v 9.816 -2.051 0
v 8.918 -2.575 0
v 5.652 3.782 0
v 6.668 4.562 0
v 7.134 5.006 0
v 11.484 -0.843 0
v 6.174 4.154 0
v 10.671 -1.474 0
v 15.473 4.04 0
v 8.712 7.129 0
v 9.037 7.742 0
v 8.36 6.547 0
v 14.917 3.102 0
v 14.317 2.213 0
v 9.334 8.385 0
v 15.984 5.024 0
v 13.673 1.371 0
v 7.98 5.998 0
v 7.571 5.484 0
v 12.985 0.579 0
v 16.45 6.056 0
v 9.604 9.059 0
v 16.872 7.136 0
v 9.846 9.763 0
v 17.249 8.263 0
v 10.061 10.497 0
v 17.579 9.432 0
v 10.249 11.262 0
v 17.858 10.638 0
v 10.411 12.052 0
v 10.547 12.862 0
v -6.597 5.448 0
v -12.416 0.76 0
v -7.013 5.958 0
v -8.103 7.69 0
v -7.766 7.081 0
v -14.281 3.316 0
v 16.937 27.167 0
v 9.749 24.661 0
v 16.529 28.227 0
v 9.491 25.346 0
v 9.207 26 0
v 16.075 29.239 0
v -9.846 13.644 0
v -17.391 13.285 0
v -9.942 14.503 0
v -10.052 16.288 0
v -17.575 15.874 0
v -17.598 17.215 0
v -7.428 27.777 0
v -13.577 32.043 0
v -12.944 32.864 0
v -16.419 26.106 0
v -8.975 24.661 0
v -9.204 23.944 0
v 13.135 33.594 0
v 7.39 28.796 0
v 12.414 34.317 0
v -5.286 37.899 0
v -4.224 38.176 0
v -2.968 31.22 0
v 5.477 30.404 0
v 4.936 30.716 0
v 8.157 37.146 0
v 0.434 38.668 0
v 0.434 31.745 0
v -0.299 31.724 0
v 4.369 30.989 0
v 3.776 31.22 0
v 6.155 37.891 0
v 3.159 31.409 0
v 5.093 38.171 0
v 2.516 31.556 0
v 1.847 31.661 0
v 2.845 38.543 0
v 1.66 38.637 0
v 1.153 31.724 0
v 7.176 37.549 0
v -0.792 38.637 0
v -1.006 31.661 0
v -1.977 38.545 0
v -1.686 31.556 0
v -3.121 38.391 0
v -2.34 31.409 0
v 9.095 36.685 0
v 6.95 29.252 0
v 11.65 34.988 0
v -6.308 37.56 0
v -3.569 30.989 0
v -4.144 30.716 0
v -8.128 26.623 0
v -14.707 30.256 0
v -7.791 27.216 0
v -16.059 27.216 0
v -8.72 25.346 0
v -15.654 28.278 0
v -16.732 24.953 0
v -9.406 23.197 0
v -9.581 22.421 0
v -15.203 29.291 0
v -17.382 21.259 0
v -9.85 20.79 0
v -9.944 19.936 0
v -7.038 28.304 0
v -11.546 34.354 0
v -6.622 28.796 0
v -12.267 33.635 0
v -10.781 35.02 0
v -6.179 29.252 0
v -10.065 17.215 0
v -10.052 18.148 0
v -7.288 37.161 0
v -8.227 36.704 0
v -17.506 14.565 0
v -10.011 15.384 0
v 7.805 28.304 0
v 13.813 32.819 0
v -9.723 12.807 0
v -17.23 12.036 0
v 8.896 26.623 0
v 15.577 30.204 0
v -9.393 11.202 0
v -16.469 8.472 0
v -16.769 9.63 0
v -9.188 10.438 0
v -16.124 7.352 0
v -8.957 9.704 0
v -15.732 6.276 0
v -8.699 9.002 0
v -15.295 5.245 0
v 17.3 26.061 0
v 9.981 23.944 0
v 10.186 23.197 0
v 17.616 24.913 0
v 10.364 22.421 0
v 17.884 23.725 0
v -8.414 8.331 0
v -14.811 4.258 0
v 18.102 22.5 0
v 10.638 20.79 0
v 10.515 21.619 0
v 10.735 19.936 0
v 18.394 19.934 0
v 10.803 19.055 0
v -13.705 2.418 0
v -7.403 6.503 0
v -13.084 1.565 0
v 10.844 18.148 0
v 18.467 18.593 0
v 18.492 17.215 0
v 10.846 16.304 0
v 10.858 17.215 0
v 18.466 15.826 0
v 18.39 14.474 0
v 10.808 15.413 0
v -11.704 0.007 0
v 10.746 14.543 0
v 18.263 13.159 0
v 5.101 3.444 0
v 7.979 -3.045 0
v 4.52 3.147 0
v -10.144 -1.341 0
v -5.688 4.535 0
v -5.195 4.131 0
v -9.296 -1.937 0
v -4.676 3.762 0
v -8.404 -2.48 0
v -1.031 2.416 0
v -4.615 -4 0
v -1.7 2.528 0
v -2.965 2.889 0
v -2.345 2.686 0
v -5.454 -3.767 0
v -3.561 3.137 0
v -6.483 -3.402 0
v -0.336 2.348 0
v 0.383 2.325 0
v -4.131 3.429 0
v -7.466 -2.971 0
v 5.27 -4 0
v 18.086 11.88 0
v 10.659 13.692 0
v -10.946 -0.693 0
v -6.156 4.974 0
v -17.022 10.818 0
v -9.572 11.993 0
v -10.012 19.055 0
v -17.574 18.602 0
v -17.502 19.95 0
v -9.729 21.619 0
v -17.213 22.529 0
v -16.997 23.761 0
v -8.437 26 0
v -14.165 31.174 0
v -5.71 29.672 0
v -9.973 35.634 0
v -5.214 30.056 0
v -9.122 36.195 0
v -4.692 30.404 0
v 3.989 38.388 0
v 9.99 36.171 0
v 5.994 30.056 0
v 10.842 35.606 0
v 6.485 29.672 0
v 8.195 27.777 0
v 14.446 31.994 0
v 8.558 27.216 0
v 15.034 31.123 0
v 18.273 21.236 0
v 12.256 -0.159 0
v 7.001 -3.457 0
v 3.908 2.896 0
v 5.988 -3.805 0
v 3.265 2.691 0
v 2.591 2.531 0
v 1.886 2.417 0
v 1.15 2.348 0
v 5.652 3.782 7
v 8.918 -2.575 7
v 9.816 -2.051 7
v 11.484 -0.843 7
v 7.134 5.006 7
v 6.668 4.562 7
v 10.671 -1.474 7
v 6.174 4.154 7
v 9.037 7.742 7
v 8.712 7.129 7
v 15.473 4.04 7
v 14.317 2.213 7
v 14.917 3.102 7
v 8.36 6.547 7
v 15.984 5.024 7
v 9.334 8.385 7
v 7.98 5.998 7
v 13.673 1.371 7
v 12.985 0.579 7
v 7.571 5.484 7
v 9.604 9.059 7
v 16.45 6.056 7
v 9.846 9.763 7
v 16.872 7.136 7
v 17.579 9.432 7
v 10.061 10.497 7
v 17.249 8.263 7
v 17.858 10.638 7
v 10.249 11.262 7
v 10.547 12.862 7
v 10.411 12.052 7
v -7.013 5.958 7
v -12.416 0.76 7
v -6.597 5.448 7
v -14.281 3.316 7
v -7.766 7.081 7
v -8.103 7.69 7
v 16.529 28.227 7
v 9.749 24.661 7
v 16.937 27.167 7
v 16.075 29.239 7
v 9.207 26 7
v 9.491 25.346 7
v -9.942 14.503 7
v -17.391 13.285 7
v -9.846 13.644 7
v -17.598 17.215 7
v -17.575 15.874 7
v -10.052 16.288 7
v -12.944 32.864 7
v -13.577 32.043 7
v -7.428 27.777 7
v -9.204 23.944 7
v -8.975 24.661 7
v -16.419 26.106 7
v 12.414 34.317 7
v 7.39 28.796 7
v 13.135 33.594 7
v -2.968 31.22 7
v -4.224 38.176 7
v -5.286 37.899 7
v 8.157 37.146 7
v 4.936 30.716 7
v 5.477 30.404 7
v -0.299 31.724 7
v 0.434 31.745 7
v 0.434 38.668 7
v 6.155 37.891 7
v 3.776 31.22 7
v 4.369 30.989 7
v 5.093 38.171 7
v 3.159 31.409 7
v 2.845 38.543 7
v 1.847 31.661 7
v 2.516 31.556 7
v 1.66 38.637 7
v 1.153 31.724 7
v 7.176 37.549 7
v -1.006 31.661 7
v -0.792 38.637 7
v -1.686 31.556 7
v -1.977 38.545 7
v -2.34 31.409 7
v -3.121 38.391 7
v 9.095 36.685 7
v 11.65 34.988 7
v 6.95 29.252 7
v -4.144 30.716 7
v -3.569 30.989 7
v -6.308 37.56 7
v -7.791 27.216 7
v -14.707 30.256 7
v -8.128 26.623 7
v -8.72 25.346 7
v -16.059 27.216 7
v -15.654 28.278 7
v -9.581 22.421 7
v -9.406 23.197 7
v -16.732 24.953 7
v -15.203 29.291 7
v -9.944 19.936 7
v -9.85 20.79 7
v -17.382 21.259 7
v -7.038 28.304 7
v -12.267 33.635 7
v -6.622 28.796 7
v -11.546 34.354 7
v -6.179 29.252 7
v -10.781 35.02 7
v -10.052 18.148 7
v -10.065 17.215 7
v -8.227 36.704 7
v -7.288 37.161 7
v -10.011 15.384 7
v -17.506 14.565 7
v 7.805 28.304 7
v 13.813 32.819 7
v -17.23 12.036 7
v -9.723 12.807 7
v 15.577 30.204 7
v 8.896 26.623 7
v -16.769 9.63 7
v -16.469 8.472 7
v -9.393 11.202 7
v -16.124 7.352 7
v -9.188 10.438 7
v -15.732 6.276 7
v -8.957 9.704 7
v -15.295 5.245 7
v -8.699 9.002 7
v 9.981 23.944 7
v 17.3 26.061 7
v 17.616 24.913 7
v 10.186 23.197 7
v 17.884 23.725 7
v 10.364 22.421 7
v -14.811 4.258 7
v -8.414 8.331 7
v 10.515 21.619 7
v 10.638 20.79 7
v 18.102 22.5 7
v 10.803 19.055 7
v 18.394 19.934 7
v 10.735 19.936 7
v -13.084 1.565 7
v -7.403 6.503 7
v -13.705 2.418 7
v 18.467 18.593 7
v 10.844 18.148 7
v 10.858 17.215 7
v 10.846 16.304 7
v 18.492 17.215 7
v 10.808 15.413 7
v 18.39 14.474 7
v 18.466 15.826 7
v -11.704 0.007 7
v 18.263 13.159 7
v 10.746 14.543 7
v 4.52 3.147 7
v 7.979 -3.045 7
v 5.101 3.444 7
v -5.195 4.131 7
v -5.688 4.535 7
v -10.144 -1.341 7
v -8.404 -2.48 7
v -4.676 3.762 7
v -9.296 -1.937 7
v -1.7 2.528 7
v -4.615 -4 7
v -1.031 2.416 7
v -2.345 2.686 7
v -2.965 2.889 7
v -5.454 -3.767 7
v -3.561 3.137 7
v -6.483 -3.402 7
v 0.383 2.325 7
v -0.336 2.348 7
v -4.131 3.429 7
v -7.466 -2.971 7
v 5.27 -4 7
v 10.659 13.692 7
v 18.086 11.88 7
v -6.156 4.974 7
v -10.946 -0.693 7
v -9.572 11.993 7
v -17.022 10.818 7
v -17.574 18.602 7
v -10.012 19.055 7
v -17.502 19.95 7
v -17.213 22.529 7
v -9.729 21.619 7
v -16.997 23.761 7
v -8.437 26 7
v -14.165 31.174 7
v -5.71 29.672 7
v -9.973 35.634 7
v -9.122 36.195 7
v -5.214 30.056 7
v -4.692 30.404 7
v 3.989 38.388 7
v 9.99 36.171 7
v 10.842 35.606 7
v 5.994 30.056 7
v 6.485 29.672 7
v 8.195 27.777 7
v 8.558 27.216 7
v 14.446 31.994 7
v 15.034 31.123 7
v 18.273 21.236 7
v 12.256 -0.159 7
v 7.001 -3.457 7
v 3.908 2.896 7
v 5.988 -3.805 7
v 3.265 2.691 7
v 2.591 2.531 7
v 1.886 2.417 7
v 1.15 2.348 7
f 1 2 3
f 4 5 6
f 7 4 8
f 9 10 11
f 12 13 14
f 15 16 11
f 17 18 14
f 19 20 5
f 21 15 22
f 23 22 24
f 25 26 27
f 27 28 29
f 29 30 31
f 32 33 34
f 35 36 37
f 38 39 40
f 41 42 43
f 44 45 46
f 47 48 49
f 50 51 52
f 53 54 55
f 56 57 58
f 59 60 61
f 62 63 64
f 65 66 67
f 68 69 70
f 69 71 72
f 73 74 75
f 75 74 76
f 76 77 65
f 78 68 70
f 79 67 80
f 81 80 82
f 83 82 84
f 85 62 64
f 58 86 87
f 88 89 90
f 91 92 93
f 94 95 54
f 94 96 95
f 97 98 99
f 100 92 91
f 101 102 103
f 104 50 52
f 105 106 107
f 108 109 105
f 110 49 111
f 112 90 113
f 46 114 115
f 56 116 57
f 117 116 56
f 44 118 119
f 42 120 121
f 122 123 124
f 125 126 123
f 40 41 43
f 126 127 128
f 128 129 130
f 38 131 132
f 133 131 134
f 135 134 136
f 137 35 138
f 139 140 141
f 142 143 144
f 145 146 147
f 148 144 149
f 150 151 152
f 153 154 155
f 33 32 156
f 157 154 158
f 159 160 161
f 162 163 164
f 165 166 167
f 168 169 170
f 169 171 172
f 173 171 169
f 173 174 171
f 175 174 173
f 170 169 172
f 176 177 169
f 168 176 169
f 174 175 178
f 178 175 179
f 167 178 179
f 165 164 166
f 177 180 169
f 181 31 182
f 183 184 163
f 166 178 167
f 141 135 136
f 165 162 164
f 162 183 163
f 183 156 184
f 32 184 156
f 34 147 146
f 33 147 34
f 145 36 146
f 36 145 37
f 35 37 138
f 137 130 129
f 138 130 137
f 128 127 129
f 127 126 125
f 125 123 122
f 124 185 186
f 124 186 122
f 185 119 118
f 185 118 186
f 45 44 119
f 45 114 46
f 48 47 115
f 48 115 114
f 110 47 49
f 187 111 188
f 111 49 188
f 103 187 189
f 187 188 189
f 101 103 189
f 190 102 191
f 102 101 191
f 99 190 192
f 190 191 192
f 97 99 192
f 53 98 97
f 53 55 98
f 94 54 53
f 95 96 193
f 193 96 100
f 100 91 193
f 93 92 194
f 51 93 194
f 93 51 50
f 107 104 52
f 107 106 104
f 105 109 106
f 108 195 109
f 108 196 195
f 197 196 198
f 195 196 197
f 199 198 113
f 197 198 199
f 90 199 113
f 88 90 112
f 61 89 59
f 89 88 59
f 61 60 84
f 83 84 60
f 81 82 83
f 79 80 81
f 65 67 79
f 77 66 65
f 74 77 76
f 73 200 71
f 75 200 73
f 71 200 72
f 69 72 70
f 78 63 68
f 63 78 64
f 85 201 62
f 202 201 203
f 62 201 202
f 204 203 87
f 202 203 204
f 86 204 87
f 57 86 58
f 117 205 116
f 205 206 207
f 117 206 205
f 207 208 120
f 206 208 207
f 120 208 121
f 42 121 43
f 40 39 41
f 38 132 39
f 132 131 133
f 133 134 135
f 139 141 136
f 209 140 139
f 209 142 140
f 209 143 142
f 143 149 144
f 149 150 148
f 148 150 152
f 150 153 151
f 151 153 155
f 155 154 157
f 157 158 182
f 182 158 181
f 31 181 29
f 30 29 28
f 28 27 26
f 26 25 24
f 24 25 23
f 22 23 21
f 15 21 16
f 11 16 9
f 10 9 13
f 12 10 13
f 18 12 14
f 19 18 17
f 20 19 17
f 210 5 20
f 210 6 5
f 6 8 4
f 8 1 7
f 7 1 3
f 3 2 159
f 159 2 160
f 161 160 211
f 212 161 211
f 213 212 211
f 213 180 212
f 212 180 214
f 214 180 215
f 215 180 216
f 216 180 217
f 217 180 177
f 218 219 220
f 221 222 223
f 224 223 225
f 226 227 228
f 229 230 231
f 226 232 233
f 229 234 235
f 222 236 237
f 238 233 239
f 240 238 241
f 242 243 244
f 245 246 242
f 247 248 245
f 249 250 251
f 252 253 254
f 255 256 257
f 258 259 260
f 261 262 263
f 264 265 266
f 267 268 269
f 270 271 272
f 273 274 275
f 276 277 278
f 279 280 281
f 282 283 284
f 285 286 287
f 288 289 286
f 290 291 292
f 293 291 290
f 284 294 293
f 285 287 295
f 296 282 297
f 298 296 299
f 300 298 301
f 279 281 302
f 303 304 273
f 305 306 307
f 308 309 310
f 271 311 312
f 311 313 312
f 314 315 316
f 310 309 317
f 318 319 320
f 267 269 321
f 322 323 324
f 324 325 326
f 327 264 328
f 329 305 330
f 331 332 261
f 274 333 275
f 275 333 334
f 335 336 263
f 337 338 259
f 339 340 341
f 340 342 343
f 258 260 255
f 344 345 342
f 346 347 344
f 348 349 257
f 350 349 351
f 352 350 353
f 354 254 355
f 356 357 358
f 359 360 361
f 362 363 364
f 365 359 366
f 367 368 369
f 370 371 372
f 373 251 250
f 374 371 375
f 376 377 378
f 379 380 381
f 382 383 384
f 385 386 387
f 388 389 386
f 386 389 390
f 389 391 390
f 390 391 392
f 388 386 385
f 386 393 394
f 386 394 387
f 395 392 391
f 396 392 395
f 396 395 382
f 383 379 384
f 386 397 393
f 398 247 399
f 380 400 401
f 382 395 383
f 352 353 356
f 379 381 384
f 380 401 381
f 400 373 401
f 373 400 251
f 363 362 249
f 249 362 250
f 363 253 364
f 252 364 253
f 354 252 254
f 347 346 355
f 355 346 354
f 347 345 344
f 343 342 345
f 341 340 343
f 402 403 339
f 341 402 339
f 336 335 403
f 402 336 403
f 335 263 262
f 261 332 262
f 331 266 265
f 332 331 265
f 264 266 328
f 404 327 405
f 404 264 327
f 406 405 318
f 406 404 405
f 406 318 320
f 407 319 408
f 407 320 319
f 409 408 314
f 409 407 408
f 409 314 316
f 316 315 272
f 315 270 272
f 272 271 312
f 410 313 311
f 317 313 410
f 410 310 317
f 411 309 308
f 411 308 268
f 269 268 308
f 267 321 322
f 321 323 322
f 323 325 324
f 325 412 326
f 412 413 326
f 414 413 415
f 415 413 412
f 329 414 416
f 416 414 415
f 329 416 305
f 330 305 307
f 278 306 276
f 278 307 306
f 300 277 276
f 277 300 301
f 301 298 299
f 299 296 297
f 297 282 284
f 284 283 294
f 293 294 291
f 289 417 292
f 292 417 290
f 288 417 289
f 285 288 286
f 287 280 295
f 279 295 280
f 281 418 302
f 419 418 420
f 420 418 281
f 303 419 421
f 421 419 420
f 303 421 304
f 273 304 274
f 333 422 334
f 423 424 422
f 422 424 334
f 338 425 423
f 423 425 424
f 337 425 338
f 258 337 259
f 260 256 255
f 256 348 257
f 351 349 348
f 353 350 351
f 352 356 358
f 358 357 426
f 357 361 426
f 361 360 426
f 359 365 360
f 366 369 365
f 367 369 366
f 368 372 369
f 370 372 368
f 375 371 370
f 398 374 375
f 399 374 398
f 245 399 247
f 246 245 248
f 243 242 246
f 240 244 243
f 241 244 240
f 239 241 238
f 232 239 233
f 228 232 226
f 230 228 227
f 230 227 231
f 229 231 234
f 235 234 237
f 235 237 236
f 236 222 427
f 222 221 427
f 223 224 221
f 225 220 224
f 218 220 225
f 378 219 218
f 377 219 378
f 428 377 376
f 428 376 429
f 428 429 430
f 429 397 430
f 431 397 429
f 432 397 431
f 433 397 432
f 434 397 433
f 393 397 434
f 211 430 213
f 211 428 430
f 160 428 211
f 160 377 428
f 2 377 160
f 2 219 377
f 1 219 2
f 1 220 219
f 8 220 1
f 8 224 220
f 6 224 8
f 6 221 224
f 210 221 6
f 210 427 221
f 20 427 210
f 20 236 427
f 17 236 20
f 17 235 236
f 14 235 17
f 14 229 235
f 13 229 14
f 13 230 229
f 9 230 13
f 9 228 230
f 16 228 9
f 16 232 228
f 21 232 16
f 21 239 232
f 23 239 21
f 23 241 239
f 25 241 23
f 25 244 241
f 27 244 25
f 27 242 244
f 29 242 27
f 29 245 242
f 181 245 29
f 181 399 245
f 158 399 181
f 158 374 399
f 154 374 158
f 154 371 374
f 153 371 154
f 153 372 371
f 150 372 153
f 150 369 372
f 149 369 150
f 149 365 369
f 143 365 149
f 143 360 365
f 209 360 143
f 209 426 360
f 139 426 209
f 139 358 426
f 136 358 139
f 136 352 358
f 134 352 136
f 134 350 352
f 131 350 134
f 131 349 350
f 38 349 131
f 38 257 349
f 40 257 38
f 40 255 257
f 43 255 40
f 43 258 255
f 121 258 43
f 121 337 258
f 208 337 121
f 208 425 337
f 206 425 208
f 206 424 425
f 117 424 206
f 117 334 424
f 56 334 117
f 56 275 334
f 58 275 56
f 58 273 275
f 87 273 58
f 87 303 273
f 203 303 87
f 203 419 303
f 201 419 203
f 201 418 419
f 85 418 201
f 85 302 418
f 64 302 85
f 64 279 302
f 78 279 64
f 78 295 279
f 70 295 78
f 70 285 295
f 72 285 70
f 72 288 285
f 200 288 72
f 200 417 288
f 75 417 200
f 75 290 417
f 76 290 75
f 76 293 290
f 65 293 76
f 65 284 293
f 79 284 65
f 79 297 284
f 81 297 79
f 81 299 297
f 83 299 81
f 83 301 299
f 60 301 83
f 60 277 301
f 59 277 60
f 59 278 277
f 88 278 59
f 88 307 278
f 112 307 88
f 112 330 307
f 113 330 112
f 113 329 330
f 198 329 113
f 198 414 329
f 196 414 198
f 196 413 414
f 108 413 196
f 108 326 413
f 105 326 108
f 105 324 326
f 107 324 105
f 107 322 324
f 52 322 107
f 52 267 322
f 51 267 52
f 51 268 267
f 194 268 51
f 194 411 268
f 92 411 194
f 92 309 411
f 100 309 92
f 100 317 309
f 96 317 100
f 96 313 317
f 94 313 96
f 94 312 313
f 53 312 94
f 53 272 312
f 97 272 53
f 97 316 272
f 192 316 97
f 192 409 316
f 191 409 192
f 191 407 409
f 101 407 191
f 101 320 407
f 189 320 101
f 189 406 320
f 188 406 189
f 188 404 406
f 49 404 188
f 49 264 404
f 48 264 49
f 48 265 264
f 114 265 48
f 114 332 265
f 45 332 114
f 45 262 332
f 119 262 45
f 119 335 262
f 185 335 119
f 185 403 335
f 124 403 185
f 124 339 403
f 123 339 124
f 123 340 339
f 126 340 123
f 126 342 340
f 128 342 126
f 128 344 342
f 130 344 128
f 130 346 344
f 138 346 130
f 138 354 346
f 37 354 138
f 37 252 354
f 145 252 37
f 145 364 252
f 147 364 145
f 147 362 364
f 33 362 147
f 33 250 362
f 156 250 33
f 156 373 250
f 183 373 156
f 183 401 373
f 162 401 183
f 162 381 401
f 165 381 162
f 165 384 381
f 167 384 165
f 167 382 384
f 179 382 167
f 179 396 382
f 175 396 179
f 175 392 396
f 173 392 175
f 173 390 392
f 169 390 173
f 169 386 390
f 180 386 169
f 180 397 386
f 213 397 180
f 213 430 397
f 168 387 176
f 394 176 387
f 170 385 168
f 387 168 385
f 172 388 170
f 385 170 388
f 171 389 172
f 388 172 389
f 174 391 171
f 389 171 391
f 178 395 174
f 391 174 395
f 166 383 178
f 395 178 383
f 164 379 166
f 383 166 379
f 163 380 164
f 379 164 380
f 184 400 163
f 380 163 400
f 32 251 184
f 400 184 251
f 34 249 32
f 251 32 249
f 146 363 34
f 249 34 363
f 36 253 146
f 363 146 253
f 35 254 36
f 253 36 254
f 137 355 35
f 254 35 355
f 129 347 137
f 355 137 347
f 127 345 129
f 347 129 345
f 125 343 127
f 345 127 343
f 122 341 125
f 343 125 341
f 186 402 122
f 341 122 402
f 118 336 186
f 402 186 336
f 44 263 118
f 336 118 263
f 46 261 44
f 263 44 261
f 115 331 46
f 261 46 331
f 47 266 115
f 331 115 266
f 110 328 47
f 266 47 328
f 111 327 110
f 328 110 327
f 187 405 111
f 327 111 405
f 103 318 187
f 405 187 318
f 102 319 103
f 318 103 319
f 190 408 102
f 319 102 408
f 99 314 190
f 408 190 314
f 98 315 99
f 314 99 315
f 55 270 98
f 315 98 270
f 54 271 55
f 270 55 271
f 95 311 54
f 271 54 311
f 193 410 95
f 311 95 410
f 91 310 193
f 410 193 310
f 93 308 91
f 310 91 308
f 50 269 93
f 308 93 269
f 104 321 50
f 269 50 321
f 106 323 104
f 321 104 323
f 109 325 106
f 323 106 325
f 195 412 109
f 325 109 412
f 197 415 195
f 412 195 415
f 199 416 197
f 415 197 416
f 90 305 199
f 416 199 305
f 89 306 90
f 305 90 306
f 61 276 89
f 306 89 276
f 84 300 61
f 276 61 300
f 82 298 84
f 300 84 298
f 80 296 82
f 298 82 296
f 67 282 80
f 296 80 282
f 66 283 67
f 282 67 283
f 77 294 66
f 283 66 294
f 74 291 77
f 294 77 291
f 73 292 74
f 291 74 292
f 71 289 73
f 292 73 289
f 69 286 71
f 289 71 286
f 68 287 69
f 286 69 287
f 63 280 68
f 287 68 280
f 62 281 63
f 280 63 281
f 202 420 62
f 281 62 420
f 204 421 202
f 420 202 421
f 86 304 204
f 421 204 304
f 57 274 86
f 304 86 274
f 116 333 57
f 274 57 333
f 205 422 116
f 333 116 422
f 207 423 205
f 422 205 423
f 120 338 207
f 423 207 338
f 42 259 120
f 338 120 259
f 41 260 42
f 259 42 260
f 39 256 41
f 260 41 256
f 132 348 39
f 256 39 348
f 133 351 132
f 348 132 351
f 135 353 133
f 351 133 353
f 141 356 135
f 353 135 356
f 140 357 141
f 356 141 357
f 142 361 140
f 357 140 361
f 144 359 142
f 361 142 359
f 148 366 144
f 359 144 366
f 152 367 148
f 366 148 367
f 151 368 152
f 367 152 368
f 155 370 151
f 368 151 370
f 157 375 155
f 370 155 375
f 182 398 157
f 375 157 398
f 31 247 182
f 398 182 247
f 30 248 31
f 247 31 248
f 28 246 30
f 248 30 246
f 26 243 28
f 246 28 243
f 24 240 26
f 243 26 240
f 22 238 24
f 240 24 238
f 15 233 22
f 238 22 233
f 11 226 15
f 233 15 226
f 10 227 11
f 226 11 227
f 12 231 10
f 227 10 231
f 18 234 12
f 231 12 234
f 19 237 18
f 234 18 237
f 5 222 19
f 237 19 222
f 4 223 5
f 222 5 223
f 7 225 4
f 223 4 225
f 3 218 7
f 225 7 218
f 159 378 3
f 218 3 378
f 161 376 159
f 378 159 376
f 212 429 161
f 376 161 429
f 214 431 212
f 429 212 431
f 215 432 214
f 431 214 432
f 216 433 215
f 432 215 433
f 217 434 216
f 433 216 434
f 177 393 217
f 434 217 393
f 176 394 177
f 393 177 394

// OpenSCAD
// file: glyph.scad
// glyph — the shared geometry of every letter in the set. Defines named geometry
// only, so it renders nothing on its own; each letter part includes it and calls
// letter(). Every dimension lives in ../../lib/common.scad.
//
// A LETTER IS NOTHING BUT A LETTER. No plinth, no tongue, no tab — it is the
// bare glyph, and it attaches by standing in the deck groove and resting on the
// groove's floor. Anything else on it would be a distraction on a learning toy.
//
// It is a flat plate of one thickness, printed face-down: no overhang anywhere,
// no supports, and the face on the bed comes out smoothest.
//
// TWO TRAPS WITH text():
//
//  * A missing font FALLS BACK SILENTLY — no warning, no error, just different
//    letters. "Liberation Sans" was the first choice here because OpenSCAD
//    bundles it; on macOS the bundled faces are not registered with fontconfig,
//    so it rendered the fallback face instead and nothing said so. To check a
//    font resolved, render a string with it and with a deliberately bogus name
//    and compare bounding boxes: identical means it fell back.
//  * `size` is not the cap height in general. For Helvetica Bold they coincide
//    (size 44 -> 44.0 mm cap), which is why letter_size reads as a height.
//    Change the font and re-measure.

include <../../lib/common.scad>

// The letter's outline, upright in the XY plane, ready to be extruded along Z
// (which is the letter's thickness, and the print's build axis).
//
//   y = 0   is the deck surface
//   y < 0   is the part standing down inside the groove. It reaches letter_bury,
//           which is where the tapered groove closes to letter_t — NOT the
//           groove's floor. The letter wedges; it never bottoms out.
module glyph_2d(ch) {
    intersection() {
        translate([0, -letter_bury])
            scale([letter_condense, 1])
                text(ch, size = letter_size, font = letter_font,
                     halign = "center", valign = "baseline");
        // Trimmed flat at the baseline. Round letters (O, C, G, S) overshoot the
        // baseline by design, and a letter standing on a convex curve rocks —
        // there is nothing to stop it leaning. The trim costs nothing visible
        // and gives every letter a flat foot on the groove floor.
        translate([-200, -letter_bury]) square([400, 400]);
    }
}

// One letter, in its print orientation: lying on its face, thickness up Z.
module letter(ch) {
    linear_extrude(letter_t) glyph_2d(ch);
}

// Where that letter sits once it is dropped into a chassis, for fit checks.
module letter_fitted(ch) {
    translate([0, letter_t/2, body_top]) rotate([90, 0, 0]) letter(ch);
}
// main file
// letter O — one part. See glyph.scad for the geometry and lib/common.scad for
// the dimensions. Prints lying on its face, exactly as exported: no supports.

include <glyph.scad>

letter("O");
